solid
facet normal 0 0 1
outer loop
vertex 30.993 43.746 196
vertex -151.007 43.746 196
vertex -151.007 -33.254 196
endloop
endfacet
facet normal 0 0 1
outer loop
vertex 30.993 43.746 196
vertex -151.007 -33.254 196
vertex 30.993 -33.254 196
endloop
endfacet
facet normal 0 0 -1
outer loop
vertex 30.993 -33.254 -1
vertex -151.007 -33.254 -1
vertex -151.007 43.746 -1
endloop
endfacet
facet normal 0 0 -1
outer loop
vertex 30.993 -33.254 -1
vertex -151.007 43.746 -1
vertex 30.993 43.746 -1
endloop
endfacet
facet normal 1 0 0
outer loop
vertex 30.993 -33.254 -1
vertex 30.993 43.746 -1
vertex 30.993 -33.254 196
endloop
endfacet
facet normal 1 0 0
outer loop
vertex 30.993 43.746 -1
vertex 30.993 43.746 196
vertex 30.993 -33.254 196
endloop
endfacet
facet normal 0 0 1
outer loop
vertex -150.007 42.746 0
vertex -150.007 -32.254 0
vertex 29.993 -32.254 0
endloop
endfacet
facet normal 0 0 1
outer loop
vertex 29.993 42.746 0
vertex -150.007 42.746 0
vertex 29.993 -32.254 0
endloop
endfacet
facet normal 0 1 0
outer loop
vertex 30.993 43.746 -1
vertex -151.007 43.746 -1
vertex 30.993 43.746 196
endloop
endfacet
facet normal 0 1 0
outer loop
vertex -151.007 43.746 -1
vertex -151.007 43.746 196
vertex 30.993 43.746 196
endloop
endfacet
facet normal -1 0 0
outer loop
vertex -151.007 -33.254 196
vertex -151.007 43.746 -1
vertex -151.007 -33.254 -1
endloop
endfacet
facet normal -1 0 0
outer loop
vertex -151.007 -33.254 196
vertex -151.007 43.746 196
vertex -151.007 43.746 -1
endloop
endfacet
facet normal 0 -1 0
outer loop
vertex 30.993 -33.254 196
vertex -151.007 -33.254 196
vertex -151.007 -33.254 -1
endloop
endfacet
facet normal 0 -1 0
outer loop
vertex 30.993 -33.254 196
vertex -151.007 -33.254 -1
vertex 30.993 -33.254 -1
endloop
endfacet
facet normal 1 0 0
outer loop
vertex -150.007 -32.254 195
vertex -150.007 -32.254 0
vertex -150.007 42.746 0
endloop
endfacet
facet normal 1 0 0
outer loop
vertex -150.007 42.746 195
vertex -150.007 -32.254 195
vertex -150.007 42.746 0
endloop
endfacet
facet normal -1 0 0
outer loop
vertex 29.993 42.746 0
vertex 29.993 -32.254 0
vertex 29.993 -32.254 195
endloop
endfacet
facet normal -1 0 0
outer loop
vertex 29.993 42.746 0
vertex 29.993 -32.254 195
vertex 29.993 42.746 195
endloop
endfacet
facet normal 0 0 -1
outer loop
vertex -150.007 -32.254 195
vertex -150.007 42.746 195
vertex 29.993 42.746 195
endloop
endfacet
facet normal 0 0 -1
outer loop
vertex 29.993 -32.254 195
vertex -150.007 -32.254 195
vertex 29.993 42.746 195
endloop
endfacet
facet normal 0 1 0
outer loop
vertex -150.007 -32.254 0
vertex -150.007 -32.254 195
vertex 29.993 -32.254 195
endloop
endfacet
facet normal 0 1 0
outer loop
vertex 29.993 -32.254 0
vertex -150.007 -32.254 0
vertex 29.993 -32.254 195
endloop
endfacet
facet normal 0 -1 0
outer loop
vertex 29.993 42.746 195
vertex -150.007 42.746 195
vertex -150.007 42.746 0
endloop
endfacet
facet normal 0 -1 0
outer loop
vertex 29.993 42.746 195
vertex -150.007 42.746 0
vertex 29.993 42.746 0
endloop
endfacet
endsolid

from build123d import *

# Parameters (mm, degrees)
F0_W     = 182
F0_H     = 77
F0_W_2   = 180
F0_H_2   = 75
F1_DEPTH = 195
F2_W     = 182
F2_H     = 77
F2_W_2   = 180
F2_H_2   = 75
F3_DEPTH = 1
F4_W     = 182
F4_H     = 77
F4_W_2   = 180
F4_H_2   = 75
F5_DEPTH = 1


with BuildPart() as f1:
    # F0 (on Top) → F1 (new body)
    with BuildSketch(Plane.XY):
        with Locations((-60.0073022693, 5.2463471889)):
            Rectangle(F0_W, F0_H)
        with Locations((-60.0073022693, 5.2463471889)):
            Rectangle(F0_W_2, F0_H_2, mode=Mode.SUBTRACT)
    extrude(amount=F1_DEPTH)

    # F2 (on face) → F3 (join)
    with BuildSketch(Plane.XY.offset(195)):
        with Locations((-60.0073022693, 5.2463471889)):
            Rectangle(F2_W, F2_H)
        with Locations((-60.0073022693, 5.2463471889)):
            Rectangle(F2_W_2, F2_H_2, mode=Mode.SUBTRACT)
        with Locations((-60.0073022693, 5.2463471889)):
            Rectangle(F2_W_2, F2_H_2)
    extrude(amount=F3_DEPTH)

    # F4 (on face) → F5 (join)
    with BuildSketch(Plane(origin=(0, 0, 0), x_dir=(1, 0, 0), z_dir=(0, 0, -1))):
        with Locations((-60.0073022693, -5.2463471889)):
            Rectangle(F4_W, F4_H)
        with Locations((-60.0073022693, -5.2463471889)):
            Rectangle(F4_W_2, F4_H_2, mode=Mode.SUBTRACT)
        with Locations((-60.0073022693, -5.2463471889)):
            Rectangle(F4_W_2, F4_H_2)
    extrude(amount=F5_DEPTH)


solid = f1.part
